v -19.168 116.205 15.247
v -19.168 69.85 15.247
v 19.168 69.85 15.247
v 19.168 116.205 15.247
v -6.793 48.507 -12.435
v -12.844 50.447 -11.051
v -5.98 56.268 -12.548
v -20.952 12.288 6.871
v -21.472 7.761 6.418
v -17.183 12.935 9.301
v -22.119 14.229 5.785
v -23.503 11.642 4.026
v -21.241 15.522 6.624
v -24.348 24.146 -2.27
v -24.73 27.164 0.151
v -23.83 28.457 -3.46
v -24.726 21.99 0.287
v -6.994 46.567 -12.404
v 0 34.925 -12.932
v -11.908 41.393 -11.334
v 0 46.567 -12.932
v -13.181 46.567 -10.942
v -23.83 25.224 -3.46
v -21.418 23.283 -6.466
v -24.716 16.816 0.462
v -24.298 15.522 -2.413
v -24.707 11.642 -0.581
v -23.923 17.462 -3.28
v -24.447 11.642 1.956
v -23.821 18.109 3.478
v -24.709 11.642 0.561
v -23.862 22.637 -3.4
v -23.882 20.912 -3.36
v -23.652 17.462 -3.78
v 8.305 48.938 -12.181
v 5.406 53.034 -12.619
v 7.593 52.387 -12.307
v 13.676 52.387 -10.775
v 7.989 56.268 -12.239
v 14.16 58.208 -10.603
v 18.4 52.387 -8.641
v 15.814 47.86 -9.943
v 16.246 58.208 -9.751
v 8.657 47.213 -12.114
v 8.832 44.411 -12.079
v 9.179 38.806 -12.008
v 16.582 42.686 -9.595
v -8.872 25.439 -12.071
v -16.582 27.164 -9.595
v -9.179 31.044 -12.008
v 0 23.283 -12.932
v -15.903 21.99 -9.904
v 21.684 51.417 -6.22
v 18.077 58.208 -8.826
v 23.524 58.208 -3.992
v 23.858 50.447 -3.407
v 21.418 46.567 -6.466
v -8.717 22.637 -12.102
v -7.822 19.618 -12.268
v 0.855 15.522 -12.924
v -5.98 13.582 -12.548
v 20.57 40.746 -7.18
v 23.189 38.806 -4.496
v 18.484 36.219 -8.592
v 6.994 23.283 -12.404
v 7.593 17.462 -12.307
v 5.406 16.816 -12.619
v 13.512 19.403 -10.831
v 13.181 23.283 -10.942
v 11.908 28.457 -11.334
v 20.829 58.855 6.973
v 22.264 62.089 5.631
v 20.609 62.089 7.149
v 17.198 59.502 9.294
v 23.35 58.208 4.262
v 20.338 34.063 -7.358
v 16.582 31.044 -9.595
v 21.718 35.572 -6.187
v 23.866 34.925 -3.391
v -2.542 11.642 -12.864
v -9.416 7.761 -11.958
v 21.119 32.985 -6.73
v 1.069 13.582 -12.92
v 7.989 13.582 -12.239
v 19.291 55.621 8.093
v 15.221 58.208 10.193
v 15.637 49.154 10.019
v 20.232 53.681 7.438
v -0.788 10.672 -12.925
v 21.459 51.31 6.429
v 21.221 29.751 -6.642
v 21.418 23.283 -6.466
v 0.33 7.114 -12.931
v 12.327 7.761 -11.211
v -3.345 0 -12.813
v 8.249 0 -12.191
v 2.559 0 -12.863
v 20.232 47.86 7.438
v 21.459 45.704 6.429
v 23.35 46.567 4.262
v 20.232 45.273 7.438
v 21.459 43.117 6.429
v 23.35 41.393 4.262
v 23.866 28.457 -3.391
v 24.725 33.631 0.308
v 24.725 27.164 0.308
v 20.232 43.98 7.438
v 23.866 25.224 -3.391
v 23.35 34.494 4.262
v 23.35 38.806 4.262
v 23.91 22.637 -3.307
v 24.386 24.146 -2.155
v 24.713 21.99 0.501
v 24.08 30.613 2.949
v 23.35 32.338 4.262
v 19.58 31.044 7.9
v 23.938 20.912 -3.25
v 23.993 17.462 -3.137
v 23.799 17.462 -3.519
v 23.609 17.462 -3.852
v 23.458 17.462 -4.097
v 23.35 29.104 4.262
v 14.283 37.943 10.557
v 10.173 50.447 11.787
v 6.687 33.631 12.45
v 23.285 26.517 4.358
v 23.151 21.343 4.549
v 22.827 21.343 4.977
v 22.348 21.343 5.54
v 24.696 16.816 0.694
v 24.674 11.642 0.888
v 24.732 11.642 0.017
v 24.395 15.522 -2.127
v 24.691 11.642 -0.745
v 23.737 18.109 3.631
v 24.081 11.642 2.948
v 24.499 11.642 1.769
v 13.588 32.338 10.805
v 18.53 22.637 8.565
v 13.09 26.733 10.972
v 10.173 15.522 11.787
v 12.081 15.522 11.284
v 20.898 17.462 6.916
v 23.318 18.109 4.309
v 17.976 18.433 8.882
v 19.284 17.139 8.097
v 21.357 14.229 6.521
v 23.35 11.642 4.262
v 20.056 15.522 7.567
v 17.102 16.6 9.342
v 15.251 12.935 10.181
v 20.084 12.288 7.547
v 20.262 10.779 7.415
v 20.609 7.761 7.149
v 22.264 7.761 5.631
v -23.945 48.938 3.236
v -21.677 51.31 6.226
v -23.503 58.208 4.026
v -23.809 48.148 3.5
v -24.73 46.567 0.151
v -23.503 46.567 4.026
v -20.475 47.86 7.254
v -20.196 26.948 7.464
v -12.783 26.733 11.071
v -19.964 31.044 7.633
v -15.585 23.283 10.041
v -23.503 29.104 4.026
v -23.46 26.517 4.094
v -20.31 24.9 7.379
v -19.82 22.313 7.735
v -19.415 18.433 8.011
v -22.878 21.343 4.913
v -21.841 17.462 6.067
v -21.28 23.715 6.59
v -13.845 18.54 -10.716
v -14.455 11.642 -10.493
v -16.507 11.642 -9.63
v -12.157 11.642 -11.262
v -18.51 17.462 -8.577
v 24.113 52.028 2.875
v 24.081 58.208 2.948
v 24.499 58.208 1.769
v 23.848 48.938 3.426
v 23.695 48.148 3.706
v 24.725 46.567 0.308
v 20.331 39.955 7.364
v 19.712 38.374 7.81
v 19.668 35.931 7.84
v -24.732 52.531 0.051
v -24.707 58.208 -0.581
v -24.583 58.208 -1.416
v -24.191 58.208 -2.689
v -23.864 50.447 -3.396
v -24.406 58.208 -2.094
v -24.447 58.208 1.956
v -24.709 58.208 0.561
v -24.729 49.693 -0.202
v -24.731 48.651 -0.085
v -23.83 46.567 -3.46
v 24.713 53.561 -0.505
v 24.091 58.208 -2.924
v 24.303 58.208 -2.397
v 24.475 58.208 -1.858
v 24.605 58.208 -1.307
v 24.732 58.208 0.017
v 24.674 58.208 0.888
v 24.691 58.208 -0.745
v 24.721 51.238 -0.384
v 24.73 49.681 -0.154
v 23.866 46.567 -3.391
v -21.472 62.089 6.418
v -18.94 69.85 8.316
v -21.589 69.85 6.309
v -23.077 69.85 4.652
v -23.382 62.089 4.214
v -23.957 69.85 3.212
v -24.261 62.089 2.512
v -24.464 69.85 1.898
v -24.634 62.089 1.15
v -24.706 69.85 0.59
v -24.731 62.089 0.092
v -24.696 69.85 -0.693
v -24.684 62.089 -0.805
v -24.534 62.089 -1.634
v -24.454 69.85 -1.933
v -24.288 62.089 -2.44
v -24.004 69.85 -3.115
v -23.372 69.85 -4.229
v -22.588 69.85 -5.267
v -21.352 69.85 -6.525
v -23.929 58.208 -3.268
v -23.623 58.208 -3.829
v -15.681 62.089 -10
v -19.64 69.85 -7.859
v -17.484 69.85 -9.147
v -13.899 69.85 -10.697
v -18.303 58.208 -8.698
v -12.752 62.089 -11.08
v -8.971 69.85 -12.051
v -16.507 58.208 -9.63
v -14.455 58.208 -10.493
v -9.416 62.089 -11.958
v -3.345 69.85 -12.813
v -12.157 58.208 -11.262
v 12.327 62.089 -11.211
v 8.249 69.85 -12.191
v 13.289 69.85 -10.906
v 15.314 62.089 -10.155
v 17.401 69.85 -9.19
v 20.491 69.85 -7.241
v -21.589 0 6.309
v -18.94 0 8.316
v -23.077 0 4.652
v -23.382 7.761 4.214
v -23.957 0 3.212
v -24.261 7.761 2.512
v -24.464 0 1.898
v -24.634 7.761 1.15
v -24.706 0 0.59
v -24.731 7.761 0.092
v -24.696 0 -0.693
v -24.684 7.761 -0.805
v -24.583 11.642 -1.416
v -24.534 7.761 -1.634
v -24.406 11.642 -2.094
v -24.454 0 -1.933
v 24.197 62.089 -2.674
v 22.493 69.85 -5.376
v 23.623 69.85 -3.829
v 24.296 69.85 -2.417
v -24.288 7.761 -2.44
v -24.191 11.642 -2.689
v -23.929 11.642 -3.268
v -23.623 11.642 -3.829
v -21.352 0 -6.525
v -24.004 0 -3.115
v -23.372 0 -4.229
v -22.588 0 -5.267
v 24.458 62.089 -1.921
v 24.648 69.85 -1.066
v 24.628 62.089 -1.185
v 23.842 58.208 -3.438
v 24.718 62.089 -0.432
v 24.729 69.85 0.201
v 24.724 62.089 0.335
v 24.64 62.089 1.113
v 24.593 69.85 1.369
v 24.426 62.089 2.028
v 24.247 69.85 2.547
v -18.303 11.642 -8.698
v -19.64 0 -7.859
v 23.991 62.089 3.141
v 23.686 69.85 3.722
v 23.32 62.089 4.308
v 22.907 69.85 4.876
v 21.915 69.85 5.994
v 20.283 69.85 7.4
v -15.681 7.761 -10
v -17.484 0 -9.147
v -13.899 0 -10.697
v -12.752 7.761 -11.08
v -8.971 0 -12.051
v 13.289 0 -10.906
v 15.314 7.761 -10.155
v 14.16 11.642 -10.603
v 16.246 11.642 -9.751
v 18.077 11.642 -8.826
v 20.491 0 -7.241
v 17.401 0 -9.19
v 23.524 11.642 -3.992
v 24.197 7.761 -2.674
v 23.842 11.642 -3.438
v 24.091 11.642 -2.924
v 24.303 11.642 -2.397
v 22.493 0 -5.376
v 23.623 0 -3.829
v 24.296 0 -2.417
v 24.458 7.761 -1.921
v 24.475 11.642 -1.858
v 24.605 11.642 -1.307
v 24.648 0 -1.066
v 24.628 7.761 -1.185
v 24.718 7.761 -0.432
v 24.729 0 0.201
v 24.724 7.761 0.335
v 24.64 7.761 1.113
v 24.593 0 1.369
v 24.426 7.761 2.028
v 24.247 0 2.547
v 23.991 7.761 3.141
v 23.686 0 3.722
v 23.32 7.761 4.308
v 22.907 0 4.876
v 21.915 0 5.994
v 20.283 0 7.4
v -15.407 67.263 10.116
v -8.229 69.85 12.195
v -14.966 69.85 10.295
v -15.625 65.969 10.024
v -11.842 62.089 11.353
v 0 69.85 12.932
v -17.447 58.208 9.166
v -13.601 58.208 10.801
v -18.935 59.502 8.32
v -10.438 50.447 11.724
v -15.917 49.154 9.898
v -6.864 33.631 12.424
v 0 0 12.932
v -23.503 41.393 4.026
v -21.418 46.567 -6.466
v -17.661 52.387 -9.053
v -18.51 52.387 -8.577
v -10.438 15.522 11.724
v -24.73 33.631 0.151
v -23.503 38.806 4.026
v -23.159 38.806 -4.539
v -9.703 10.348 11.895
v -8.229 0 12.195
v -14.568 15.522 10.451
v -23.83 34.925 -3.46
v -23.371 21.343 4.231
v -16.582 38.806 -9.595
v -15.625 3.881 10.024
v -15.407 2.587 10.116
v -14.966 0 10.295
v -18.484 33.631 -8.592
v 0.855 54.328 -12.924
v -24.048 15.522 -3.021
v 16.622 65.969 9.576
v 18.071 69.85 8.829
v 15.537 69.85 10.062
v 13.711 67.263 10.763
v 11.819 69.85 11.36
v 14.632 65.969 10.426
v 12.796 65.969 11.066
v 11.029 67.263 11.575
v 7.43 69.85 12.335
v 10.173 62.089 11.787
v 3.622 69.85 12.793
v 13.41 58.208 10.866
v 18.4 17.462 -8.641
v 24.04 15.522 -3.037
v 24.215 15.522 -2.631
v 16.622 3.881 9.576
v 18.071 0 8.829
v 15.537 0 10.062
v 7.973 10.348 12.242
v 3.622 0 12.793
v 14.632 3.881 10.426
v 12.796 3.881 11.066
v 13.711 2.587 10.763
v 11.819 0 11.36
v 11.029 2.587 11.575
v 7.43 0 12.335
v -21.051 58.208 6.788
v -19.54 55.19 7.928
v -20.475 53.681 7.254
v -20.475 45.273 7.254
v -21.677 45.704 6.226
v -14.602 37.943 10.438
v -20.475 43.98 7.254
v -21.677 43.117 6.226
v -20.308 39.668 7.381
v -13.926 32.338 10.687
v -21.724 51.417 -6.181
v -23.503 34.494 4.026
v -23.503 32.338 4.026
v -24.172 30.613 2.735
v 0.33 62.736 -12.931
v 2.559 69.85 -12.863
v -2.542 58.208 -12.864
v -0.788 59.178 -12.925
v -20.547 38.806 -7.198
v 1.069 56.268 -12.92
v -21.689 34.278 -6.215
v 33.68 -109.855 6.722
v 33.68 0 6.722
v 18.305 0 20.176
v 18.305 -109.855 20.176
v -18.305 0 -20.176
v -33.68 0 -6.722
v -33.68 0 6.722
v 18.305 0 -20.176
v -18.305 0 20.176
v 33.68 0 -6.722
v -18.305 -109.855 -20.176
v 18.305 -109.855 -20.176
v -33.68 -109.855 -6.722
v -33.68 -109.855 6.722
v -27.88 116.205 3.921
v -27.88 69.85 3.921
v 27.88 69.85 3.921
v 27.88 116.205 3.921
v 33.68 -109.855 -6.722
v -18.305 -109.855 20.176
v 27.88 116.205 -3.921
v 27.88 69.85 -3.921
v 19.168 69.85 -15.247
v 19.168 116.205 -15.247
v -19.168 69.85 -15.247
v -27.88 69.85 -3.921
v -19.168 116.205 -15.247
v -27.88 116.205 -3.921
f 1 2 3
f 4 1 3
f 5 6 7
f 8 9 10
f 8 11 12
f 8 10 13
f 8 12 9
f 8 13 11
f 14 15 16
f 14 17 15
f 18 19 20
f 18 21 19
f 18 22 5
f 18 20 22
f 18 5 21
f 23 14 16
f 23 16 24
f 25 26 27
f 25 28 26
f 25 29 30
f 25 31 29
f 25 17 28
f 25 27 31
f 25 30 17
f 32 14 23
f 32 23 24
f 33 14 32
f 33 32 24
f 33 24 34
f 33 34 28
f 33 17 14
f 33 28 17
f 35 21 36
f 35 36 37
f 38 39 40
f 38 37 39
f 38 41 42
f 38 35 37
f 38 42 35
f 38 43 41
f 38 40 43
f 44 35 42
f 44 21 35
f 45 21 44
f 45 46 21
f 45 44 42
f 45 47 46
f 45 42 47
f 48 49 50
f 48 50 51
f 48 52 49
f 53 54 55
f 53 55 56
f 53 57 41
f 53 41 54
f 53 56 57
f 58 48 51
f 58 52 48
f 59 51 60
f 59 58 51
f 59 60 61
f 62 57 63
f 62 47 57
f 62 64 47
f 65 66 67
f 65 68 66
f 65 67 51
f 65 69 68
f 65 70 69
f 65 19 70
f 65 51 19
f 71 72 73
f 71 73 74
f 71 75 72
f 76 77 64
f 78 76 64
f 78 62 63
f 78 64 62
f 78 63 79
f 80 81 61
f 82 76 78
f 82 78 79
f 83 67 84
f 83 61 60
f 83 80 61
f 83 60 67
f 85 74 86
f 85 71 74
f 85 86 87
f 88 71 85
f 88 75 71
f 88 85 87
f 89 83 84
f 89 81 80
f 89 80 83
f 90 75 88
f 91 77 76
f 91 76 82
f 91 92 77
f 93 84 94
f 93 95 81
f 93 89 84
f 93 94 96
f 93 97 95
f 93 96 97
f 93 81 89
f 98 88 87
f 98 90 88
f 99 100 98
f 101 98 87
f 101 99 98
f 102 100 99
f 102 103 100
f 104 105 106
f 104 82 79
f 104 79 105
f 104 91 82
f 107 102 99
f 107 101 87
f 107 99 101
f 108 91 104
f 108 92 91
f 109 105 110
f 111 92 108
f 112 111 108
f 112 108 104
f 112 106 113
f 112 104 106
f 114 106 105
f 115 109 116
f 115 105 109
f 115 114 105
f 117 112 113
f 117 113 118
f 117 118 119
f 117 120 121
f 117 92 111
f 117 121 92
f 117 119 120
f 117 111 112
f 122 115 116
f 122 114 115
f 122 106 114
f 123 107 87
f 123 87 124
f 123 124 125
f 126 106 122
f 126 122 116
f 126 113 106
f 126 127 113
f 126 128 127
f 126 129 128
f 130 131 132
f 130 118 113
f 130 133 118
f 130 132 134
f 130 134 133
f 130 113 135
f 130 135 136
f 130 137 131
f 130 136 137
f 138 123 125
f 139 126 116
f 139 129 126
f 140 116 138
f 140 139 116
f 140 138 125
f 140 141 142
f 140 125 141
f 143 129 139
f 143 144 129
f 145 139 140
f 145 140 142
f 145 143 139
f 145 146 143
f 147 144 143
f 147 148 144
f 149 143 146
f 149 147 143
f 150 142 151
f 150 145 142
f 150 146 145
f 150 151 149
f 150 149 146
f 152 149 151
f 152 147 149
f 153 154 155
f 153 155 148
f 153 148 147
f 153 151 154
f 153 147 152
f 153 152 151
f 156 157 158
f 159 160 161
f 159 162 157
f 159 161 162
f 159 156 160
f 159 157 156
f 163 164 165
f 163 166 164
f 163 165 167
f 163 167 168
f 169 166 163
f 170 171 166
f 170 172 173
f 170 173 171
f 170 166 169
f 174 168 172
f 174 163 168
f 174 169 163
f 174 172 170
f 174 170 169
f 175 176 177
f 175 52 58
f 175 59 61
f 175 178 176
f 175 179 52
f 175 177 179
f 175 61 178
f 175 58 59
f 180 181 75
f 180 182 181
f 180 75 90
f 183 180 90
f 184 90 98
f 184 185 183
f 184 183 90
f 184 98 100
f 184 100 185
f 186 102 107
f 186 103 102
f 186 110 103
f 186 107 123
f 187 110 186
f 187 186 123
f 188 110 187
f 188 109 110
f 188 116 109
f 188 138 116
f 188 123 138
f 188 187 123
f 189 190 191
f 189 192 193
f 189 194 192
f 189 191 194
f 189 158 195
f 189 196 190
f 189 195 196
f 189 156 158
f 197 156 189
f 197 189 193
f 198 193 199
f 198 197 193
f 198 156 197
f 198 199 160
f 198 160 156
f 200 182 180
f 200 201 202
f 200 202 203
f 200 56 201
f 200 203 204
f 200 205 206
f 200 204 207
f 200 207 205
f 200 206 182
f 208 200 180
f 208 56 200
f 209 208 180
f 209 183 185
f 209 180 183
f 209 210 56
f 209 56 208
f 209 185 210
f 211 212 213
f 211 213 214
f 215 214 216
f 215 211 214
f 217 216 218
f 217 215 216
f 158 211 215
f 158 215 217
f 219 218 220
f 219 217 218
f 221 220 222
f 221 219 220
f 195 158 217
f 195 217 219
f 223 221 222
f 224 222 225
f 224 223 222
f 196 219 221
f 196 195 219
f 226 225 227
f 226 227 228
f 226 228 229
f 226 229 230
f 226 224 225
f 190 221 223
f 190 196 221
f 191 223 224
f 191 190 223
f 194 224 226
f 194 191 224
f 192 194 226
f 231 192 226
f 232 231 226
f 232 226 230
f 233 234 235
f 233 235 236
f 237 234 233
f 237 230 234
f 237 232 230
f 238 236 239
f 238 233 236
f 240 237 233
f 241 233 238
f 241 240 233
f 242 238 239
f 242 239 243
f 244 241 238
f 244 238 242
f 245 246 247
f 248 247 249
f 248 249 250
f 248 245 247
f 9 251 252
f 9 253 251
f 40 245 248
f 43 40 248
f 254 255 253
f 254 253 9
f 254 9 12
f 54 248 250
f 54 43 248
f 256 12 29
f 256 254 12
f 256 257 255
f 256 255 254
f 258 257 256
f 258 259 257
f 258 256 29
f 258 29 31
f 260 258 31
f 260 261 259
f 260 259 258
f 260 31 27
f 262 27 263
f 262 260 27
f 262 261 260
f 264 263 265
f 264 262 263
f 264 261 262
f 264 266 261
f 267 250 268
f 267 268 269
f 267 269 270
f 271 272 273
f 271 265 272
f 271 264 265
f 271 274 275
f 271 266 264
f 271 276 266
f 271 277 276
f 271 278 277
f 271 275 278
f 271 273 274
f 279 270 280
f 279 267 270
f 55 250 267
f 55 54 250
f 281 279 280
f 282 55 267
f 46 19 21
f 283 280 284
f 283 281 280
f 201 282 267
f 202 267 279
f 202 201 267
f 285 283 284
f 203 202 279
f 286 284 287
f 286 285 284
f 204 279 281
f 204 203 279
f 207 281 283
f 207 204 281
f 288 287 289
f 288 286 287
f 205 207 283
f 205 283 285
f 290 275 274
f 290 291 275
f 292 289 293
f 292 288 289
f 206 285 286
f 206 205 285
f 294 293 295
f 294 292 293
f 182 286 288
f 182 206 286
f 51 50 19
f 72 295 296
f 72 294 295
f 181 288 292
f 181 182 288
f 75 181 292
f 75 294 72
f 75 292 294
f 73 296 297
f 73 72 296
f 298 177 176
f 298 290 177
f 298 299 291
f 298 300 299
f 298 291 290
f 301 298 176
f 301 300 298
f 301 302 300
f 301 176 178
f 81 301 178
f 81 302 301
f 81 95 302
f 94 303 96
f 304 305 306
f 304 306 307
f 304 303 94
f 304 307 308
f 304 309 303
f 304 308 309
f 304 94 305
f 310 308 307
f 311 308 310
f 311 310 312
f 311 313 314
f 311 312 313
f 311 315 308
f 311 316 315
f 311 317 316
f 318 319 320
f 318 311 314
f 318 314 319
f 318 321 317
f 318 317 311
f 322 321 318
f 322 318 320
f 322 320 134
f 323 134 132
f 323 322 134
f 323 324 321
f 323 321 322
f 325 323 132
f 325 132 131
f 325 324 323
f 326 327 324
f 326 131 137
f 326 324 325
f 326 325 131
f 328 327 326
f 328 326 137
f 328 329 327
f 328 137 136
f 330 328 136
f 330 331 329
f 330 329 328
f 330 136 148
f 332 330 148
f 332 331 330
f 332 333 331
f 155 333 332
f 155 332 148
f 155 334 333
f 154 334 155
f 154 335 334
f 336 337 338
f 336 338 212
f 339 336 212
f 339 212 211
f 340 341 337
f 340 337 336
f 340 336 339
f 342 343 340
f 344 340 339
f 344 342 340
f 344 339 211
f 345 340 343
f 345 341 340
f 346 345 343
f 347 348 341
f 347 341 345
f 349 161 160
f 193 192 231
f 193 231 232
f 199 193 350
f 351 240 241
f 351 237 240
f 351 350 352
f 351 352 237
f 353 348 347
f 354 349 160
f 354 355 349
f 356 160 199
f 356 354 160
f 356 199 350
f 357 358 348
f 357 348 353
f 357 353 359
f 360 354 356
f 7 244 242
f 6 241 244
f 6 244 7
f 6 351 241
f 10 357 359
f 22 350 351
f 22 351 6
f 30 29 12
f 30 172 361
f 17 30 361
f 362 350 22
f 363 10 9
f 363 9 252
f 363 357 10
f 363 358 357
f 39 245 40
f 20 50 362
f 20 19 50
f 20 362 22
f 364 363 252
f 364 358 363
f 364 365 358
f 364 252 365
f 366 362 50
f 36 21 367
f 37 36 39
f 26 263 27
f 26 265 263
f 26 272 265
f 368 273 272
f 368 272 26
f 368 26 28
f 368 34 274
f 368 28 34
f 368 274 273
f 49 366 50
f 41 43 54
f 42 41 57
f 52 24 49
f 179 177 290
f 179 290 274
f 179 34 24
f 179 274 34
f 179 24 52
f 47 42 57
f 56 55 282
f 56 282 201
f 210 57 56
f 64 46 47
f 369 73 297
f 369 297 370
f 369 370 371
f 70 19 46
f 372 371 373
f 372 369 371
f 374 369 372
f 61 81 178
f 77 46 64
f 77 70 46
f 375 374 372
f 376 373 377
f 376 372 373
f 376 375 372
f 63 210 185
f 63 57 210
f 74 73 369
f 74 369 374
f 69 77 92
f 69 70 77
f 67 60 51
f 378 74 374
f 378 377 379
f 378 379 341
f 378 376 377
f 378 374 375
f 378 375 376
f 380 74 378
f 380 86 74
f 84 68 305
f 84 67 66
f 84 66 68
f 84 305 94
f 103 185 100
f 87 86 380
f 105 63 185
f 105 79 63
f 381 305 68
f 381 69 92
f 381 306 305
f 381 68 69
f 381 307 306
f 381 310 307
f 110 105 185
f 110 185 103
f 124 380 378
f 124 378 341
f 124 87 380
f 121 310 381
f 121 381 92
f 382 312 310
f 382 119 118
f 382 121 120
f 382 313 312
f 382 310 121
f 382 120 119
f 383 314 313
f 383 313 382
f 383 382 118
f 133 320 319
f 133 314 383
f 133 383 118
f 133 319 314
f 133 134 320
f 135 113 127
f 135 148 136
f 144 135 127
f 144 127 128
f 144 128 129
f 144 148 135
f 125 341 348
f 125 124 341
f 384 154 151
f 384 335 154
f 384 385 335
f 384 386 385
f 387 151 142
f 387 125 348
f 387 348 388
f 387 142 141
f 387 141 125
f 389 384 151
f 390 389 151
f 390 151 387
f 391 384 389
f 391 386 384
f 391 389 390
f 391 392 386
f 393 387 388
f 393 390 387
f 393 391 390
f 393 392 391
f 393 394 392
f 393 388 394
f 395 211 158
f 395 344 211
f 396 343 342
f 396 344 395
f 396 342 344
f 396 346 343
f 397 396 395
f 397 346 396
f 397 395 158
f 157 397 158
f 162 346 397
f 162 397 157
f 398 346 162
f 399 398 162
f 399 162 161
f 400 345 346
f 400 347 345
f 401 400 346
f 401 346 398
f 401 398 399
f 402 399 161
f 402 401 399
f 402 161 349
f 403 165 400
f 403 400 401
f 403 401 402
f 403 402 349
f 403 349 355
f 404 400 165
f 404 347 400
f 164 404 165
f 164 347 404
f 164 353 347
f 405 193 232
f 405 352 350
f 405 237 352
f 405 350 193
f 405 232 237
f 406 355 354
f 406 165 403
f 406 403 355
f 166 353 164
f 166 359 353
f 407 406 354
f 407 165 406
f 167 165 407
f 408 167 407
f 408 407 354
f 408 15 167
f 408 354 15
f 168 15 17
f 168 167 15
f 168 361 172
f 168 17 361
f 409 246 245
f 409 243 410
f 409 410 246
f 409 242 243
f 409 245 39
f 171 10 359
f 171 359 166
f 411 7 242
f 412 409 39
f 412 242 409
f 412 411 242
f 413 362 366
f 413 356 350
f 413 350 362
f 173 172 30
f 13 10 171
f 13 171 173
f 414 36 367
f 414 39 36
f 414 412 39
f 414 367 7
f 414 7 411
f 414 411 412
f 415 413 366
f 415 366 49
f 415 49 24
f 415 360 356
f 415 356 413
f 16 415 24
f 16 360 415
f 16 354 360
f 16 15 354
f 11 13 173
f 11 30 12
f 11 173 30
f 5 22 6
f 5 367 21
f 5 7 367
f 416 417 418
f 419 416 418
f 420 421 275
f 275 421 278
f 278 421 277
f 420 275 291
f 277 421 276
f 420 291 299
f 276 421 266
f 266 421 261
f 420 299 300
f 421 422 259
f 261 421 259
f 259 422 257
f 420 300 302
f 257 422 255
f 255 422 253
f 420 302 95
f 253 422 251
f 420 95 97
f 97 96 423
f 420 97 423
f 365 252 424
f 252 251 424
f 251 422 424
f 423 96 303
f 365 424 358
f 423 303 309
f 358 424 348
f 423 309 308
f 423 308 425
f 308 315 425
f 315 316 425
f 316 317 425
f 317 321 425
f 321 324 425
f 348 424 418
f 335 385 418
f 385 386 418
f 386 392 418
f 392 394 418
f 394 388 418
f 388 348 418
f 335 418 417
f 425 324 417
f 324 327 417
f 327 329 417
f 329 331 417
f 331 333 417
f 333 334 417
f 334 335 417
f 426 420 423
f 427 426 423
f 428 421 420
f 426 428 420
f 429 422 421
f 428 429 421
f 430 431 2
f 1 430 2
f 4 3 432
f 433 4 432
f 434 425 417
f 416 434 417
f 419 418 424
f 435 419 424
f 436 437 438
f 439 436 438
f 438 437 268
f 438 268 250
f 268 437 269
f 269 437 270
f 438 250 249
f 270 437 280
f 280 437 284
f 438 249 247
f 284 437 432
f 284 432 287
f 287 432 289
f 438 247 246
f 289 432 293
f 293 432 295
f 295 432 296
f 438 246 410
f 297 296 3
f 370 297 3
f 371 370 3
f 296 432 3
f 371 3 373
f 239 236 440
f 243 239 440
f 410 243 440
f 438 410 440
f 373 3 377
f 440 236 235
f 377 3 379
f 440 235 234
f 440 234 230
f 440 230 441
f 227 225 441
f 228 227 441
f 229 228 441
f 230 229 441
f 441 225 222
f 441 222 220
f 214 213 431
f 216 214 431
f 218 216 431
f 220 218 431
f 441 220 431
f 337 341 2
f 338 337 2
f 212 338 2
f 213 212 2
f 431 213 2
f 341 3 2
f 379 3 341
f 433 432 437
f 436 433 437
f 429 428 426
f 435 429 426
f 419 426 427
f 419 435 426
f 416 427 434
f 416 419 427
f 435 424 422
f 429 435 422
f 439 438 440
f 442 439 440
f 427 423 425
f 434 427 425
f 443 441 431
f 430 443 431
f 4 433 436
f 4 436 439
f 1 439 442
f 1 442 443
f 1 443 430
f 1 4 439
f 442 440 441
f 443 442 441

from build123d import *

# Parameters (mm, degrees)
F2_DEPTH = 109.855
F3_DEPTH = 69.85
F6_DEPTH = 46.355


with BuildPart() as f2:
    # F0 (on Front) → F2 (new body)
    with BuildSketch(Plane.XZ):
        Polygon((18.3046516031, 20.17557621), (-18.3046516031, 20.17557621), (-33.6800664663, 6.722088622), (-33.6800664663, -6.722088622), (-18.3046516031, -20.17557621), (18.3046516031, -20.17557621), (33.6800664663, -6.722088622), (33.6800664663, 6.722088622), align=None)
    extrude(amount=F2_DEPTH)

    # F1 (on Front) → F3 (join)
    with BuildSketch(Plane.XZ):
        with BuildLine():
            add(Edge.make_bspline(
                [(0, 12.9320109263), (-42.8369876382, 12.9320109263), (-21.4184938191, -6.4660054632), (0, -25.8640218526), (21.4184938191, -6.4660054632), (42.8369876382, 12.9320109263), (0, 12.9320109263)],
                knots=[4.7123889804, 4.7123889804, 4.7123889804, 6.8067840828, 6.8067840828, 8.9011791852, 8.9011791852, 10.9955742876, 10.9955742876, 10.9955742876], degree=2, weights=[1, 0.5, 1, 0.5, 1, 0.5, 1]))
        make_face()
    extrude(amount=-F3_DEPTH)

    # F5 (on offset) → F6 (join)
    with BuildSketch(Plane(origin=(0, 69.85, 0), x_dir=(-1, 0, 0), z_dir=(0, 1, 0))):
        Polygon((-27.8800725937, 3.9206352085), (-27.8800725937, 0), (-27.8800725937, -3.9206352085), (-19.1675499082, -15.246915631), (0, -15.246915631), (19.1675499082, -15.246915631), (27.8800725937, -3.9206352085), (27.8800725937, 3.9206352085), (19.1675499082, 15.246915631), (0, 15.246915631), (-19.1675499082, 15.246915631), align=None)
    extrude(amount=F6_DEPTH)


solid = f2.part
